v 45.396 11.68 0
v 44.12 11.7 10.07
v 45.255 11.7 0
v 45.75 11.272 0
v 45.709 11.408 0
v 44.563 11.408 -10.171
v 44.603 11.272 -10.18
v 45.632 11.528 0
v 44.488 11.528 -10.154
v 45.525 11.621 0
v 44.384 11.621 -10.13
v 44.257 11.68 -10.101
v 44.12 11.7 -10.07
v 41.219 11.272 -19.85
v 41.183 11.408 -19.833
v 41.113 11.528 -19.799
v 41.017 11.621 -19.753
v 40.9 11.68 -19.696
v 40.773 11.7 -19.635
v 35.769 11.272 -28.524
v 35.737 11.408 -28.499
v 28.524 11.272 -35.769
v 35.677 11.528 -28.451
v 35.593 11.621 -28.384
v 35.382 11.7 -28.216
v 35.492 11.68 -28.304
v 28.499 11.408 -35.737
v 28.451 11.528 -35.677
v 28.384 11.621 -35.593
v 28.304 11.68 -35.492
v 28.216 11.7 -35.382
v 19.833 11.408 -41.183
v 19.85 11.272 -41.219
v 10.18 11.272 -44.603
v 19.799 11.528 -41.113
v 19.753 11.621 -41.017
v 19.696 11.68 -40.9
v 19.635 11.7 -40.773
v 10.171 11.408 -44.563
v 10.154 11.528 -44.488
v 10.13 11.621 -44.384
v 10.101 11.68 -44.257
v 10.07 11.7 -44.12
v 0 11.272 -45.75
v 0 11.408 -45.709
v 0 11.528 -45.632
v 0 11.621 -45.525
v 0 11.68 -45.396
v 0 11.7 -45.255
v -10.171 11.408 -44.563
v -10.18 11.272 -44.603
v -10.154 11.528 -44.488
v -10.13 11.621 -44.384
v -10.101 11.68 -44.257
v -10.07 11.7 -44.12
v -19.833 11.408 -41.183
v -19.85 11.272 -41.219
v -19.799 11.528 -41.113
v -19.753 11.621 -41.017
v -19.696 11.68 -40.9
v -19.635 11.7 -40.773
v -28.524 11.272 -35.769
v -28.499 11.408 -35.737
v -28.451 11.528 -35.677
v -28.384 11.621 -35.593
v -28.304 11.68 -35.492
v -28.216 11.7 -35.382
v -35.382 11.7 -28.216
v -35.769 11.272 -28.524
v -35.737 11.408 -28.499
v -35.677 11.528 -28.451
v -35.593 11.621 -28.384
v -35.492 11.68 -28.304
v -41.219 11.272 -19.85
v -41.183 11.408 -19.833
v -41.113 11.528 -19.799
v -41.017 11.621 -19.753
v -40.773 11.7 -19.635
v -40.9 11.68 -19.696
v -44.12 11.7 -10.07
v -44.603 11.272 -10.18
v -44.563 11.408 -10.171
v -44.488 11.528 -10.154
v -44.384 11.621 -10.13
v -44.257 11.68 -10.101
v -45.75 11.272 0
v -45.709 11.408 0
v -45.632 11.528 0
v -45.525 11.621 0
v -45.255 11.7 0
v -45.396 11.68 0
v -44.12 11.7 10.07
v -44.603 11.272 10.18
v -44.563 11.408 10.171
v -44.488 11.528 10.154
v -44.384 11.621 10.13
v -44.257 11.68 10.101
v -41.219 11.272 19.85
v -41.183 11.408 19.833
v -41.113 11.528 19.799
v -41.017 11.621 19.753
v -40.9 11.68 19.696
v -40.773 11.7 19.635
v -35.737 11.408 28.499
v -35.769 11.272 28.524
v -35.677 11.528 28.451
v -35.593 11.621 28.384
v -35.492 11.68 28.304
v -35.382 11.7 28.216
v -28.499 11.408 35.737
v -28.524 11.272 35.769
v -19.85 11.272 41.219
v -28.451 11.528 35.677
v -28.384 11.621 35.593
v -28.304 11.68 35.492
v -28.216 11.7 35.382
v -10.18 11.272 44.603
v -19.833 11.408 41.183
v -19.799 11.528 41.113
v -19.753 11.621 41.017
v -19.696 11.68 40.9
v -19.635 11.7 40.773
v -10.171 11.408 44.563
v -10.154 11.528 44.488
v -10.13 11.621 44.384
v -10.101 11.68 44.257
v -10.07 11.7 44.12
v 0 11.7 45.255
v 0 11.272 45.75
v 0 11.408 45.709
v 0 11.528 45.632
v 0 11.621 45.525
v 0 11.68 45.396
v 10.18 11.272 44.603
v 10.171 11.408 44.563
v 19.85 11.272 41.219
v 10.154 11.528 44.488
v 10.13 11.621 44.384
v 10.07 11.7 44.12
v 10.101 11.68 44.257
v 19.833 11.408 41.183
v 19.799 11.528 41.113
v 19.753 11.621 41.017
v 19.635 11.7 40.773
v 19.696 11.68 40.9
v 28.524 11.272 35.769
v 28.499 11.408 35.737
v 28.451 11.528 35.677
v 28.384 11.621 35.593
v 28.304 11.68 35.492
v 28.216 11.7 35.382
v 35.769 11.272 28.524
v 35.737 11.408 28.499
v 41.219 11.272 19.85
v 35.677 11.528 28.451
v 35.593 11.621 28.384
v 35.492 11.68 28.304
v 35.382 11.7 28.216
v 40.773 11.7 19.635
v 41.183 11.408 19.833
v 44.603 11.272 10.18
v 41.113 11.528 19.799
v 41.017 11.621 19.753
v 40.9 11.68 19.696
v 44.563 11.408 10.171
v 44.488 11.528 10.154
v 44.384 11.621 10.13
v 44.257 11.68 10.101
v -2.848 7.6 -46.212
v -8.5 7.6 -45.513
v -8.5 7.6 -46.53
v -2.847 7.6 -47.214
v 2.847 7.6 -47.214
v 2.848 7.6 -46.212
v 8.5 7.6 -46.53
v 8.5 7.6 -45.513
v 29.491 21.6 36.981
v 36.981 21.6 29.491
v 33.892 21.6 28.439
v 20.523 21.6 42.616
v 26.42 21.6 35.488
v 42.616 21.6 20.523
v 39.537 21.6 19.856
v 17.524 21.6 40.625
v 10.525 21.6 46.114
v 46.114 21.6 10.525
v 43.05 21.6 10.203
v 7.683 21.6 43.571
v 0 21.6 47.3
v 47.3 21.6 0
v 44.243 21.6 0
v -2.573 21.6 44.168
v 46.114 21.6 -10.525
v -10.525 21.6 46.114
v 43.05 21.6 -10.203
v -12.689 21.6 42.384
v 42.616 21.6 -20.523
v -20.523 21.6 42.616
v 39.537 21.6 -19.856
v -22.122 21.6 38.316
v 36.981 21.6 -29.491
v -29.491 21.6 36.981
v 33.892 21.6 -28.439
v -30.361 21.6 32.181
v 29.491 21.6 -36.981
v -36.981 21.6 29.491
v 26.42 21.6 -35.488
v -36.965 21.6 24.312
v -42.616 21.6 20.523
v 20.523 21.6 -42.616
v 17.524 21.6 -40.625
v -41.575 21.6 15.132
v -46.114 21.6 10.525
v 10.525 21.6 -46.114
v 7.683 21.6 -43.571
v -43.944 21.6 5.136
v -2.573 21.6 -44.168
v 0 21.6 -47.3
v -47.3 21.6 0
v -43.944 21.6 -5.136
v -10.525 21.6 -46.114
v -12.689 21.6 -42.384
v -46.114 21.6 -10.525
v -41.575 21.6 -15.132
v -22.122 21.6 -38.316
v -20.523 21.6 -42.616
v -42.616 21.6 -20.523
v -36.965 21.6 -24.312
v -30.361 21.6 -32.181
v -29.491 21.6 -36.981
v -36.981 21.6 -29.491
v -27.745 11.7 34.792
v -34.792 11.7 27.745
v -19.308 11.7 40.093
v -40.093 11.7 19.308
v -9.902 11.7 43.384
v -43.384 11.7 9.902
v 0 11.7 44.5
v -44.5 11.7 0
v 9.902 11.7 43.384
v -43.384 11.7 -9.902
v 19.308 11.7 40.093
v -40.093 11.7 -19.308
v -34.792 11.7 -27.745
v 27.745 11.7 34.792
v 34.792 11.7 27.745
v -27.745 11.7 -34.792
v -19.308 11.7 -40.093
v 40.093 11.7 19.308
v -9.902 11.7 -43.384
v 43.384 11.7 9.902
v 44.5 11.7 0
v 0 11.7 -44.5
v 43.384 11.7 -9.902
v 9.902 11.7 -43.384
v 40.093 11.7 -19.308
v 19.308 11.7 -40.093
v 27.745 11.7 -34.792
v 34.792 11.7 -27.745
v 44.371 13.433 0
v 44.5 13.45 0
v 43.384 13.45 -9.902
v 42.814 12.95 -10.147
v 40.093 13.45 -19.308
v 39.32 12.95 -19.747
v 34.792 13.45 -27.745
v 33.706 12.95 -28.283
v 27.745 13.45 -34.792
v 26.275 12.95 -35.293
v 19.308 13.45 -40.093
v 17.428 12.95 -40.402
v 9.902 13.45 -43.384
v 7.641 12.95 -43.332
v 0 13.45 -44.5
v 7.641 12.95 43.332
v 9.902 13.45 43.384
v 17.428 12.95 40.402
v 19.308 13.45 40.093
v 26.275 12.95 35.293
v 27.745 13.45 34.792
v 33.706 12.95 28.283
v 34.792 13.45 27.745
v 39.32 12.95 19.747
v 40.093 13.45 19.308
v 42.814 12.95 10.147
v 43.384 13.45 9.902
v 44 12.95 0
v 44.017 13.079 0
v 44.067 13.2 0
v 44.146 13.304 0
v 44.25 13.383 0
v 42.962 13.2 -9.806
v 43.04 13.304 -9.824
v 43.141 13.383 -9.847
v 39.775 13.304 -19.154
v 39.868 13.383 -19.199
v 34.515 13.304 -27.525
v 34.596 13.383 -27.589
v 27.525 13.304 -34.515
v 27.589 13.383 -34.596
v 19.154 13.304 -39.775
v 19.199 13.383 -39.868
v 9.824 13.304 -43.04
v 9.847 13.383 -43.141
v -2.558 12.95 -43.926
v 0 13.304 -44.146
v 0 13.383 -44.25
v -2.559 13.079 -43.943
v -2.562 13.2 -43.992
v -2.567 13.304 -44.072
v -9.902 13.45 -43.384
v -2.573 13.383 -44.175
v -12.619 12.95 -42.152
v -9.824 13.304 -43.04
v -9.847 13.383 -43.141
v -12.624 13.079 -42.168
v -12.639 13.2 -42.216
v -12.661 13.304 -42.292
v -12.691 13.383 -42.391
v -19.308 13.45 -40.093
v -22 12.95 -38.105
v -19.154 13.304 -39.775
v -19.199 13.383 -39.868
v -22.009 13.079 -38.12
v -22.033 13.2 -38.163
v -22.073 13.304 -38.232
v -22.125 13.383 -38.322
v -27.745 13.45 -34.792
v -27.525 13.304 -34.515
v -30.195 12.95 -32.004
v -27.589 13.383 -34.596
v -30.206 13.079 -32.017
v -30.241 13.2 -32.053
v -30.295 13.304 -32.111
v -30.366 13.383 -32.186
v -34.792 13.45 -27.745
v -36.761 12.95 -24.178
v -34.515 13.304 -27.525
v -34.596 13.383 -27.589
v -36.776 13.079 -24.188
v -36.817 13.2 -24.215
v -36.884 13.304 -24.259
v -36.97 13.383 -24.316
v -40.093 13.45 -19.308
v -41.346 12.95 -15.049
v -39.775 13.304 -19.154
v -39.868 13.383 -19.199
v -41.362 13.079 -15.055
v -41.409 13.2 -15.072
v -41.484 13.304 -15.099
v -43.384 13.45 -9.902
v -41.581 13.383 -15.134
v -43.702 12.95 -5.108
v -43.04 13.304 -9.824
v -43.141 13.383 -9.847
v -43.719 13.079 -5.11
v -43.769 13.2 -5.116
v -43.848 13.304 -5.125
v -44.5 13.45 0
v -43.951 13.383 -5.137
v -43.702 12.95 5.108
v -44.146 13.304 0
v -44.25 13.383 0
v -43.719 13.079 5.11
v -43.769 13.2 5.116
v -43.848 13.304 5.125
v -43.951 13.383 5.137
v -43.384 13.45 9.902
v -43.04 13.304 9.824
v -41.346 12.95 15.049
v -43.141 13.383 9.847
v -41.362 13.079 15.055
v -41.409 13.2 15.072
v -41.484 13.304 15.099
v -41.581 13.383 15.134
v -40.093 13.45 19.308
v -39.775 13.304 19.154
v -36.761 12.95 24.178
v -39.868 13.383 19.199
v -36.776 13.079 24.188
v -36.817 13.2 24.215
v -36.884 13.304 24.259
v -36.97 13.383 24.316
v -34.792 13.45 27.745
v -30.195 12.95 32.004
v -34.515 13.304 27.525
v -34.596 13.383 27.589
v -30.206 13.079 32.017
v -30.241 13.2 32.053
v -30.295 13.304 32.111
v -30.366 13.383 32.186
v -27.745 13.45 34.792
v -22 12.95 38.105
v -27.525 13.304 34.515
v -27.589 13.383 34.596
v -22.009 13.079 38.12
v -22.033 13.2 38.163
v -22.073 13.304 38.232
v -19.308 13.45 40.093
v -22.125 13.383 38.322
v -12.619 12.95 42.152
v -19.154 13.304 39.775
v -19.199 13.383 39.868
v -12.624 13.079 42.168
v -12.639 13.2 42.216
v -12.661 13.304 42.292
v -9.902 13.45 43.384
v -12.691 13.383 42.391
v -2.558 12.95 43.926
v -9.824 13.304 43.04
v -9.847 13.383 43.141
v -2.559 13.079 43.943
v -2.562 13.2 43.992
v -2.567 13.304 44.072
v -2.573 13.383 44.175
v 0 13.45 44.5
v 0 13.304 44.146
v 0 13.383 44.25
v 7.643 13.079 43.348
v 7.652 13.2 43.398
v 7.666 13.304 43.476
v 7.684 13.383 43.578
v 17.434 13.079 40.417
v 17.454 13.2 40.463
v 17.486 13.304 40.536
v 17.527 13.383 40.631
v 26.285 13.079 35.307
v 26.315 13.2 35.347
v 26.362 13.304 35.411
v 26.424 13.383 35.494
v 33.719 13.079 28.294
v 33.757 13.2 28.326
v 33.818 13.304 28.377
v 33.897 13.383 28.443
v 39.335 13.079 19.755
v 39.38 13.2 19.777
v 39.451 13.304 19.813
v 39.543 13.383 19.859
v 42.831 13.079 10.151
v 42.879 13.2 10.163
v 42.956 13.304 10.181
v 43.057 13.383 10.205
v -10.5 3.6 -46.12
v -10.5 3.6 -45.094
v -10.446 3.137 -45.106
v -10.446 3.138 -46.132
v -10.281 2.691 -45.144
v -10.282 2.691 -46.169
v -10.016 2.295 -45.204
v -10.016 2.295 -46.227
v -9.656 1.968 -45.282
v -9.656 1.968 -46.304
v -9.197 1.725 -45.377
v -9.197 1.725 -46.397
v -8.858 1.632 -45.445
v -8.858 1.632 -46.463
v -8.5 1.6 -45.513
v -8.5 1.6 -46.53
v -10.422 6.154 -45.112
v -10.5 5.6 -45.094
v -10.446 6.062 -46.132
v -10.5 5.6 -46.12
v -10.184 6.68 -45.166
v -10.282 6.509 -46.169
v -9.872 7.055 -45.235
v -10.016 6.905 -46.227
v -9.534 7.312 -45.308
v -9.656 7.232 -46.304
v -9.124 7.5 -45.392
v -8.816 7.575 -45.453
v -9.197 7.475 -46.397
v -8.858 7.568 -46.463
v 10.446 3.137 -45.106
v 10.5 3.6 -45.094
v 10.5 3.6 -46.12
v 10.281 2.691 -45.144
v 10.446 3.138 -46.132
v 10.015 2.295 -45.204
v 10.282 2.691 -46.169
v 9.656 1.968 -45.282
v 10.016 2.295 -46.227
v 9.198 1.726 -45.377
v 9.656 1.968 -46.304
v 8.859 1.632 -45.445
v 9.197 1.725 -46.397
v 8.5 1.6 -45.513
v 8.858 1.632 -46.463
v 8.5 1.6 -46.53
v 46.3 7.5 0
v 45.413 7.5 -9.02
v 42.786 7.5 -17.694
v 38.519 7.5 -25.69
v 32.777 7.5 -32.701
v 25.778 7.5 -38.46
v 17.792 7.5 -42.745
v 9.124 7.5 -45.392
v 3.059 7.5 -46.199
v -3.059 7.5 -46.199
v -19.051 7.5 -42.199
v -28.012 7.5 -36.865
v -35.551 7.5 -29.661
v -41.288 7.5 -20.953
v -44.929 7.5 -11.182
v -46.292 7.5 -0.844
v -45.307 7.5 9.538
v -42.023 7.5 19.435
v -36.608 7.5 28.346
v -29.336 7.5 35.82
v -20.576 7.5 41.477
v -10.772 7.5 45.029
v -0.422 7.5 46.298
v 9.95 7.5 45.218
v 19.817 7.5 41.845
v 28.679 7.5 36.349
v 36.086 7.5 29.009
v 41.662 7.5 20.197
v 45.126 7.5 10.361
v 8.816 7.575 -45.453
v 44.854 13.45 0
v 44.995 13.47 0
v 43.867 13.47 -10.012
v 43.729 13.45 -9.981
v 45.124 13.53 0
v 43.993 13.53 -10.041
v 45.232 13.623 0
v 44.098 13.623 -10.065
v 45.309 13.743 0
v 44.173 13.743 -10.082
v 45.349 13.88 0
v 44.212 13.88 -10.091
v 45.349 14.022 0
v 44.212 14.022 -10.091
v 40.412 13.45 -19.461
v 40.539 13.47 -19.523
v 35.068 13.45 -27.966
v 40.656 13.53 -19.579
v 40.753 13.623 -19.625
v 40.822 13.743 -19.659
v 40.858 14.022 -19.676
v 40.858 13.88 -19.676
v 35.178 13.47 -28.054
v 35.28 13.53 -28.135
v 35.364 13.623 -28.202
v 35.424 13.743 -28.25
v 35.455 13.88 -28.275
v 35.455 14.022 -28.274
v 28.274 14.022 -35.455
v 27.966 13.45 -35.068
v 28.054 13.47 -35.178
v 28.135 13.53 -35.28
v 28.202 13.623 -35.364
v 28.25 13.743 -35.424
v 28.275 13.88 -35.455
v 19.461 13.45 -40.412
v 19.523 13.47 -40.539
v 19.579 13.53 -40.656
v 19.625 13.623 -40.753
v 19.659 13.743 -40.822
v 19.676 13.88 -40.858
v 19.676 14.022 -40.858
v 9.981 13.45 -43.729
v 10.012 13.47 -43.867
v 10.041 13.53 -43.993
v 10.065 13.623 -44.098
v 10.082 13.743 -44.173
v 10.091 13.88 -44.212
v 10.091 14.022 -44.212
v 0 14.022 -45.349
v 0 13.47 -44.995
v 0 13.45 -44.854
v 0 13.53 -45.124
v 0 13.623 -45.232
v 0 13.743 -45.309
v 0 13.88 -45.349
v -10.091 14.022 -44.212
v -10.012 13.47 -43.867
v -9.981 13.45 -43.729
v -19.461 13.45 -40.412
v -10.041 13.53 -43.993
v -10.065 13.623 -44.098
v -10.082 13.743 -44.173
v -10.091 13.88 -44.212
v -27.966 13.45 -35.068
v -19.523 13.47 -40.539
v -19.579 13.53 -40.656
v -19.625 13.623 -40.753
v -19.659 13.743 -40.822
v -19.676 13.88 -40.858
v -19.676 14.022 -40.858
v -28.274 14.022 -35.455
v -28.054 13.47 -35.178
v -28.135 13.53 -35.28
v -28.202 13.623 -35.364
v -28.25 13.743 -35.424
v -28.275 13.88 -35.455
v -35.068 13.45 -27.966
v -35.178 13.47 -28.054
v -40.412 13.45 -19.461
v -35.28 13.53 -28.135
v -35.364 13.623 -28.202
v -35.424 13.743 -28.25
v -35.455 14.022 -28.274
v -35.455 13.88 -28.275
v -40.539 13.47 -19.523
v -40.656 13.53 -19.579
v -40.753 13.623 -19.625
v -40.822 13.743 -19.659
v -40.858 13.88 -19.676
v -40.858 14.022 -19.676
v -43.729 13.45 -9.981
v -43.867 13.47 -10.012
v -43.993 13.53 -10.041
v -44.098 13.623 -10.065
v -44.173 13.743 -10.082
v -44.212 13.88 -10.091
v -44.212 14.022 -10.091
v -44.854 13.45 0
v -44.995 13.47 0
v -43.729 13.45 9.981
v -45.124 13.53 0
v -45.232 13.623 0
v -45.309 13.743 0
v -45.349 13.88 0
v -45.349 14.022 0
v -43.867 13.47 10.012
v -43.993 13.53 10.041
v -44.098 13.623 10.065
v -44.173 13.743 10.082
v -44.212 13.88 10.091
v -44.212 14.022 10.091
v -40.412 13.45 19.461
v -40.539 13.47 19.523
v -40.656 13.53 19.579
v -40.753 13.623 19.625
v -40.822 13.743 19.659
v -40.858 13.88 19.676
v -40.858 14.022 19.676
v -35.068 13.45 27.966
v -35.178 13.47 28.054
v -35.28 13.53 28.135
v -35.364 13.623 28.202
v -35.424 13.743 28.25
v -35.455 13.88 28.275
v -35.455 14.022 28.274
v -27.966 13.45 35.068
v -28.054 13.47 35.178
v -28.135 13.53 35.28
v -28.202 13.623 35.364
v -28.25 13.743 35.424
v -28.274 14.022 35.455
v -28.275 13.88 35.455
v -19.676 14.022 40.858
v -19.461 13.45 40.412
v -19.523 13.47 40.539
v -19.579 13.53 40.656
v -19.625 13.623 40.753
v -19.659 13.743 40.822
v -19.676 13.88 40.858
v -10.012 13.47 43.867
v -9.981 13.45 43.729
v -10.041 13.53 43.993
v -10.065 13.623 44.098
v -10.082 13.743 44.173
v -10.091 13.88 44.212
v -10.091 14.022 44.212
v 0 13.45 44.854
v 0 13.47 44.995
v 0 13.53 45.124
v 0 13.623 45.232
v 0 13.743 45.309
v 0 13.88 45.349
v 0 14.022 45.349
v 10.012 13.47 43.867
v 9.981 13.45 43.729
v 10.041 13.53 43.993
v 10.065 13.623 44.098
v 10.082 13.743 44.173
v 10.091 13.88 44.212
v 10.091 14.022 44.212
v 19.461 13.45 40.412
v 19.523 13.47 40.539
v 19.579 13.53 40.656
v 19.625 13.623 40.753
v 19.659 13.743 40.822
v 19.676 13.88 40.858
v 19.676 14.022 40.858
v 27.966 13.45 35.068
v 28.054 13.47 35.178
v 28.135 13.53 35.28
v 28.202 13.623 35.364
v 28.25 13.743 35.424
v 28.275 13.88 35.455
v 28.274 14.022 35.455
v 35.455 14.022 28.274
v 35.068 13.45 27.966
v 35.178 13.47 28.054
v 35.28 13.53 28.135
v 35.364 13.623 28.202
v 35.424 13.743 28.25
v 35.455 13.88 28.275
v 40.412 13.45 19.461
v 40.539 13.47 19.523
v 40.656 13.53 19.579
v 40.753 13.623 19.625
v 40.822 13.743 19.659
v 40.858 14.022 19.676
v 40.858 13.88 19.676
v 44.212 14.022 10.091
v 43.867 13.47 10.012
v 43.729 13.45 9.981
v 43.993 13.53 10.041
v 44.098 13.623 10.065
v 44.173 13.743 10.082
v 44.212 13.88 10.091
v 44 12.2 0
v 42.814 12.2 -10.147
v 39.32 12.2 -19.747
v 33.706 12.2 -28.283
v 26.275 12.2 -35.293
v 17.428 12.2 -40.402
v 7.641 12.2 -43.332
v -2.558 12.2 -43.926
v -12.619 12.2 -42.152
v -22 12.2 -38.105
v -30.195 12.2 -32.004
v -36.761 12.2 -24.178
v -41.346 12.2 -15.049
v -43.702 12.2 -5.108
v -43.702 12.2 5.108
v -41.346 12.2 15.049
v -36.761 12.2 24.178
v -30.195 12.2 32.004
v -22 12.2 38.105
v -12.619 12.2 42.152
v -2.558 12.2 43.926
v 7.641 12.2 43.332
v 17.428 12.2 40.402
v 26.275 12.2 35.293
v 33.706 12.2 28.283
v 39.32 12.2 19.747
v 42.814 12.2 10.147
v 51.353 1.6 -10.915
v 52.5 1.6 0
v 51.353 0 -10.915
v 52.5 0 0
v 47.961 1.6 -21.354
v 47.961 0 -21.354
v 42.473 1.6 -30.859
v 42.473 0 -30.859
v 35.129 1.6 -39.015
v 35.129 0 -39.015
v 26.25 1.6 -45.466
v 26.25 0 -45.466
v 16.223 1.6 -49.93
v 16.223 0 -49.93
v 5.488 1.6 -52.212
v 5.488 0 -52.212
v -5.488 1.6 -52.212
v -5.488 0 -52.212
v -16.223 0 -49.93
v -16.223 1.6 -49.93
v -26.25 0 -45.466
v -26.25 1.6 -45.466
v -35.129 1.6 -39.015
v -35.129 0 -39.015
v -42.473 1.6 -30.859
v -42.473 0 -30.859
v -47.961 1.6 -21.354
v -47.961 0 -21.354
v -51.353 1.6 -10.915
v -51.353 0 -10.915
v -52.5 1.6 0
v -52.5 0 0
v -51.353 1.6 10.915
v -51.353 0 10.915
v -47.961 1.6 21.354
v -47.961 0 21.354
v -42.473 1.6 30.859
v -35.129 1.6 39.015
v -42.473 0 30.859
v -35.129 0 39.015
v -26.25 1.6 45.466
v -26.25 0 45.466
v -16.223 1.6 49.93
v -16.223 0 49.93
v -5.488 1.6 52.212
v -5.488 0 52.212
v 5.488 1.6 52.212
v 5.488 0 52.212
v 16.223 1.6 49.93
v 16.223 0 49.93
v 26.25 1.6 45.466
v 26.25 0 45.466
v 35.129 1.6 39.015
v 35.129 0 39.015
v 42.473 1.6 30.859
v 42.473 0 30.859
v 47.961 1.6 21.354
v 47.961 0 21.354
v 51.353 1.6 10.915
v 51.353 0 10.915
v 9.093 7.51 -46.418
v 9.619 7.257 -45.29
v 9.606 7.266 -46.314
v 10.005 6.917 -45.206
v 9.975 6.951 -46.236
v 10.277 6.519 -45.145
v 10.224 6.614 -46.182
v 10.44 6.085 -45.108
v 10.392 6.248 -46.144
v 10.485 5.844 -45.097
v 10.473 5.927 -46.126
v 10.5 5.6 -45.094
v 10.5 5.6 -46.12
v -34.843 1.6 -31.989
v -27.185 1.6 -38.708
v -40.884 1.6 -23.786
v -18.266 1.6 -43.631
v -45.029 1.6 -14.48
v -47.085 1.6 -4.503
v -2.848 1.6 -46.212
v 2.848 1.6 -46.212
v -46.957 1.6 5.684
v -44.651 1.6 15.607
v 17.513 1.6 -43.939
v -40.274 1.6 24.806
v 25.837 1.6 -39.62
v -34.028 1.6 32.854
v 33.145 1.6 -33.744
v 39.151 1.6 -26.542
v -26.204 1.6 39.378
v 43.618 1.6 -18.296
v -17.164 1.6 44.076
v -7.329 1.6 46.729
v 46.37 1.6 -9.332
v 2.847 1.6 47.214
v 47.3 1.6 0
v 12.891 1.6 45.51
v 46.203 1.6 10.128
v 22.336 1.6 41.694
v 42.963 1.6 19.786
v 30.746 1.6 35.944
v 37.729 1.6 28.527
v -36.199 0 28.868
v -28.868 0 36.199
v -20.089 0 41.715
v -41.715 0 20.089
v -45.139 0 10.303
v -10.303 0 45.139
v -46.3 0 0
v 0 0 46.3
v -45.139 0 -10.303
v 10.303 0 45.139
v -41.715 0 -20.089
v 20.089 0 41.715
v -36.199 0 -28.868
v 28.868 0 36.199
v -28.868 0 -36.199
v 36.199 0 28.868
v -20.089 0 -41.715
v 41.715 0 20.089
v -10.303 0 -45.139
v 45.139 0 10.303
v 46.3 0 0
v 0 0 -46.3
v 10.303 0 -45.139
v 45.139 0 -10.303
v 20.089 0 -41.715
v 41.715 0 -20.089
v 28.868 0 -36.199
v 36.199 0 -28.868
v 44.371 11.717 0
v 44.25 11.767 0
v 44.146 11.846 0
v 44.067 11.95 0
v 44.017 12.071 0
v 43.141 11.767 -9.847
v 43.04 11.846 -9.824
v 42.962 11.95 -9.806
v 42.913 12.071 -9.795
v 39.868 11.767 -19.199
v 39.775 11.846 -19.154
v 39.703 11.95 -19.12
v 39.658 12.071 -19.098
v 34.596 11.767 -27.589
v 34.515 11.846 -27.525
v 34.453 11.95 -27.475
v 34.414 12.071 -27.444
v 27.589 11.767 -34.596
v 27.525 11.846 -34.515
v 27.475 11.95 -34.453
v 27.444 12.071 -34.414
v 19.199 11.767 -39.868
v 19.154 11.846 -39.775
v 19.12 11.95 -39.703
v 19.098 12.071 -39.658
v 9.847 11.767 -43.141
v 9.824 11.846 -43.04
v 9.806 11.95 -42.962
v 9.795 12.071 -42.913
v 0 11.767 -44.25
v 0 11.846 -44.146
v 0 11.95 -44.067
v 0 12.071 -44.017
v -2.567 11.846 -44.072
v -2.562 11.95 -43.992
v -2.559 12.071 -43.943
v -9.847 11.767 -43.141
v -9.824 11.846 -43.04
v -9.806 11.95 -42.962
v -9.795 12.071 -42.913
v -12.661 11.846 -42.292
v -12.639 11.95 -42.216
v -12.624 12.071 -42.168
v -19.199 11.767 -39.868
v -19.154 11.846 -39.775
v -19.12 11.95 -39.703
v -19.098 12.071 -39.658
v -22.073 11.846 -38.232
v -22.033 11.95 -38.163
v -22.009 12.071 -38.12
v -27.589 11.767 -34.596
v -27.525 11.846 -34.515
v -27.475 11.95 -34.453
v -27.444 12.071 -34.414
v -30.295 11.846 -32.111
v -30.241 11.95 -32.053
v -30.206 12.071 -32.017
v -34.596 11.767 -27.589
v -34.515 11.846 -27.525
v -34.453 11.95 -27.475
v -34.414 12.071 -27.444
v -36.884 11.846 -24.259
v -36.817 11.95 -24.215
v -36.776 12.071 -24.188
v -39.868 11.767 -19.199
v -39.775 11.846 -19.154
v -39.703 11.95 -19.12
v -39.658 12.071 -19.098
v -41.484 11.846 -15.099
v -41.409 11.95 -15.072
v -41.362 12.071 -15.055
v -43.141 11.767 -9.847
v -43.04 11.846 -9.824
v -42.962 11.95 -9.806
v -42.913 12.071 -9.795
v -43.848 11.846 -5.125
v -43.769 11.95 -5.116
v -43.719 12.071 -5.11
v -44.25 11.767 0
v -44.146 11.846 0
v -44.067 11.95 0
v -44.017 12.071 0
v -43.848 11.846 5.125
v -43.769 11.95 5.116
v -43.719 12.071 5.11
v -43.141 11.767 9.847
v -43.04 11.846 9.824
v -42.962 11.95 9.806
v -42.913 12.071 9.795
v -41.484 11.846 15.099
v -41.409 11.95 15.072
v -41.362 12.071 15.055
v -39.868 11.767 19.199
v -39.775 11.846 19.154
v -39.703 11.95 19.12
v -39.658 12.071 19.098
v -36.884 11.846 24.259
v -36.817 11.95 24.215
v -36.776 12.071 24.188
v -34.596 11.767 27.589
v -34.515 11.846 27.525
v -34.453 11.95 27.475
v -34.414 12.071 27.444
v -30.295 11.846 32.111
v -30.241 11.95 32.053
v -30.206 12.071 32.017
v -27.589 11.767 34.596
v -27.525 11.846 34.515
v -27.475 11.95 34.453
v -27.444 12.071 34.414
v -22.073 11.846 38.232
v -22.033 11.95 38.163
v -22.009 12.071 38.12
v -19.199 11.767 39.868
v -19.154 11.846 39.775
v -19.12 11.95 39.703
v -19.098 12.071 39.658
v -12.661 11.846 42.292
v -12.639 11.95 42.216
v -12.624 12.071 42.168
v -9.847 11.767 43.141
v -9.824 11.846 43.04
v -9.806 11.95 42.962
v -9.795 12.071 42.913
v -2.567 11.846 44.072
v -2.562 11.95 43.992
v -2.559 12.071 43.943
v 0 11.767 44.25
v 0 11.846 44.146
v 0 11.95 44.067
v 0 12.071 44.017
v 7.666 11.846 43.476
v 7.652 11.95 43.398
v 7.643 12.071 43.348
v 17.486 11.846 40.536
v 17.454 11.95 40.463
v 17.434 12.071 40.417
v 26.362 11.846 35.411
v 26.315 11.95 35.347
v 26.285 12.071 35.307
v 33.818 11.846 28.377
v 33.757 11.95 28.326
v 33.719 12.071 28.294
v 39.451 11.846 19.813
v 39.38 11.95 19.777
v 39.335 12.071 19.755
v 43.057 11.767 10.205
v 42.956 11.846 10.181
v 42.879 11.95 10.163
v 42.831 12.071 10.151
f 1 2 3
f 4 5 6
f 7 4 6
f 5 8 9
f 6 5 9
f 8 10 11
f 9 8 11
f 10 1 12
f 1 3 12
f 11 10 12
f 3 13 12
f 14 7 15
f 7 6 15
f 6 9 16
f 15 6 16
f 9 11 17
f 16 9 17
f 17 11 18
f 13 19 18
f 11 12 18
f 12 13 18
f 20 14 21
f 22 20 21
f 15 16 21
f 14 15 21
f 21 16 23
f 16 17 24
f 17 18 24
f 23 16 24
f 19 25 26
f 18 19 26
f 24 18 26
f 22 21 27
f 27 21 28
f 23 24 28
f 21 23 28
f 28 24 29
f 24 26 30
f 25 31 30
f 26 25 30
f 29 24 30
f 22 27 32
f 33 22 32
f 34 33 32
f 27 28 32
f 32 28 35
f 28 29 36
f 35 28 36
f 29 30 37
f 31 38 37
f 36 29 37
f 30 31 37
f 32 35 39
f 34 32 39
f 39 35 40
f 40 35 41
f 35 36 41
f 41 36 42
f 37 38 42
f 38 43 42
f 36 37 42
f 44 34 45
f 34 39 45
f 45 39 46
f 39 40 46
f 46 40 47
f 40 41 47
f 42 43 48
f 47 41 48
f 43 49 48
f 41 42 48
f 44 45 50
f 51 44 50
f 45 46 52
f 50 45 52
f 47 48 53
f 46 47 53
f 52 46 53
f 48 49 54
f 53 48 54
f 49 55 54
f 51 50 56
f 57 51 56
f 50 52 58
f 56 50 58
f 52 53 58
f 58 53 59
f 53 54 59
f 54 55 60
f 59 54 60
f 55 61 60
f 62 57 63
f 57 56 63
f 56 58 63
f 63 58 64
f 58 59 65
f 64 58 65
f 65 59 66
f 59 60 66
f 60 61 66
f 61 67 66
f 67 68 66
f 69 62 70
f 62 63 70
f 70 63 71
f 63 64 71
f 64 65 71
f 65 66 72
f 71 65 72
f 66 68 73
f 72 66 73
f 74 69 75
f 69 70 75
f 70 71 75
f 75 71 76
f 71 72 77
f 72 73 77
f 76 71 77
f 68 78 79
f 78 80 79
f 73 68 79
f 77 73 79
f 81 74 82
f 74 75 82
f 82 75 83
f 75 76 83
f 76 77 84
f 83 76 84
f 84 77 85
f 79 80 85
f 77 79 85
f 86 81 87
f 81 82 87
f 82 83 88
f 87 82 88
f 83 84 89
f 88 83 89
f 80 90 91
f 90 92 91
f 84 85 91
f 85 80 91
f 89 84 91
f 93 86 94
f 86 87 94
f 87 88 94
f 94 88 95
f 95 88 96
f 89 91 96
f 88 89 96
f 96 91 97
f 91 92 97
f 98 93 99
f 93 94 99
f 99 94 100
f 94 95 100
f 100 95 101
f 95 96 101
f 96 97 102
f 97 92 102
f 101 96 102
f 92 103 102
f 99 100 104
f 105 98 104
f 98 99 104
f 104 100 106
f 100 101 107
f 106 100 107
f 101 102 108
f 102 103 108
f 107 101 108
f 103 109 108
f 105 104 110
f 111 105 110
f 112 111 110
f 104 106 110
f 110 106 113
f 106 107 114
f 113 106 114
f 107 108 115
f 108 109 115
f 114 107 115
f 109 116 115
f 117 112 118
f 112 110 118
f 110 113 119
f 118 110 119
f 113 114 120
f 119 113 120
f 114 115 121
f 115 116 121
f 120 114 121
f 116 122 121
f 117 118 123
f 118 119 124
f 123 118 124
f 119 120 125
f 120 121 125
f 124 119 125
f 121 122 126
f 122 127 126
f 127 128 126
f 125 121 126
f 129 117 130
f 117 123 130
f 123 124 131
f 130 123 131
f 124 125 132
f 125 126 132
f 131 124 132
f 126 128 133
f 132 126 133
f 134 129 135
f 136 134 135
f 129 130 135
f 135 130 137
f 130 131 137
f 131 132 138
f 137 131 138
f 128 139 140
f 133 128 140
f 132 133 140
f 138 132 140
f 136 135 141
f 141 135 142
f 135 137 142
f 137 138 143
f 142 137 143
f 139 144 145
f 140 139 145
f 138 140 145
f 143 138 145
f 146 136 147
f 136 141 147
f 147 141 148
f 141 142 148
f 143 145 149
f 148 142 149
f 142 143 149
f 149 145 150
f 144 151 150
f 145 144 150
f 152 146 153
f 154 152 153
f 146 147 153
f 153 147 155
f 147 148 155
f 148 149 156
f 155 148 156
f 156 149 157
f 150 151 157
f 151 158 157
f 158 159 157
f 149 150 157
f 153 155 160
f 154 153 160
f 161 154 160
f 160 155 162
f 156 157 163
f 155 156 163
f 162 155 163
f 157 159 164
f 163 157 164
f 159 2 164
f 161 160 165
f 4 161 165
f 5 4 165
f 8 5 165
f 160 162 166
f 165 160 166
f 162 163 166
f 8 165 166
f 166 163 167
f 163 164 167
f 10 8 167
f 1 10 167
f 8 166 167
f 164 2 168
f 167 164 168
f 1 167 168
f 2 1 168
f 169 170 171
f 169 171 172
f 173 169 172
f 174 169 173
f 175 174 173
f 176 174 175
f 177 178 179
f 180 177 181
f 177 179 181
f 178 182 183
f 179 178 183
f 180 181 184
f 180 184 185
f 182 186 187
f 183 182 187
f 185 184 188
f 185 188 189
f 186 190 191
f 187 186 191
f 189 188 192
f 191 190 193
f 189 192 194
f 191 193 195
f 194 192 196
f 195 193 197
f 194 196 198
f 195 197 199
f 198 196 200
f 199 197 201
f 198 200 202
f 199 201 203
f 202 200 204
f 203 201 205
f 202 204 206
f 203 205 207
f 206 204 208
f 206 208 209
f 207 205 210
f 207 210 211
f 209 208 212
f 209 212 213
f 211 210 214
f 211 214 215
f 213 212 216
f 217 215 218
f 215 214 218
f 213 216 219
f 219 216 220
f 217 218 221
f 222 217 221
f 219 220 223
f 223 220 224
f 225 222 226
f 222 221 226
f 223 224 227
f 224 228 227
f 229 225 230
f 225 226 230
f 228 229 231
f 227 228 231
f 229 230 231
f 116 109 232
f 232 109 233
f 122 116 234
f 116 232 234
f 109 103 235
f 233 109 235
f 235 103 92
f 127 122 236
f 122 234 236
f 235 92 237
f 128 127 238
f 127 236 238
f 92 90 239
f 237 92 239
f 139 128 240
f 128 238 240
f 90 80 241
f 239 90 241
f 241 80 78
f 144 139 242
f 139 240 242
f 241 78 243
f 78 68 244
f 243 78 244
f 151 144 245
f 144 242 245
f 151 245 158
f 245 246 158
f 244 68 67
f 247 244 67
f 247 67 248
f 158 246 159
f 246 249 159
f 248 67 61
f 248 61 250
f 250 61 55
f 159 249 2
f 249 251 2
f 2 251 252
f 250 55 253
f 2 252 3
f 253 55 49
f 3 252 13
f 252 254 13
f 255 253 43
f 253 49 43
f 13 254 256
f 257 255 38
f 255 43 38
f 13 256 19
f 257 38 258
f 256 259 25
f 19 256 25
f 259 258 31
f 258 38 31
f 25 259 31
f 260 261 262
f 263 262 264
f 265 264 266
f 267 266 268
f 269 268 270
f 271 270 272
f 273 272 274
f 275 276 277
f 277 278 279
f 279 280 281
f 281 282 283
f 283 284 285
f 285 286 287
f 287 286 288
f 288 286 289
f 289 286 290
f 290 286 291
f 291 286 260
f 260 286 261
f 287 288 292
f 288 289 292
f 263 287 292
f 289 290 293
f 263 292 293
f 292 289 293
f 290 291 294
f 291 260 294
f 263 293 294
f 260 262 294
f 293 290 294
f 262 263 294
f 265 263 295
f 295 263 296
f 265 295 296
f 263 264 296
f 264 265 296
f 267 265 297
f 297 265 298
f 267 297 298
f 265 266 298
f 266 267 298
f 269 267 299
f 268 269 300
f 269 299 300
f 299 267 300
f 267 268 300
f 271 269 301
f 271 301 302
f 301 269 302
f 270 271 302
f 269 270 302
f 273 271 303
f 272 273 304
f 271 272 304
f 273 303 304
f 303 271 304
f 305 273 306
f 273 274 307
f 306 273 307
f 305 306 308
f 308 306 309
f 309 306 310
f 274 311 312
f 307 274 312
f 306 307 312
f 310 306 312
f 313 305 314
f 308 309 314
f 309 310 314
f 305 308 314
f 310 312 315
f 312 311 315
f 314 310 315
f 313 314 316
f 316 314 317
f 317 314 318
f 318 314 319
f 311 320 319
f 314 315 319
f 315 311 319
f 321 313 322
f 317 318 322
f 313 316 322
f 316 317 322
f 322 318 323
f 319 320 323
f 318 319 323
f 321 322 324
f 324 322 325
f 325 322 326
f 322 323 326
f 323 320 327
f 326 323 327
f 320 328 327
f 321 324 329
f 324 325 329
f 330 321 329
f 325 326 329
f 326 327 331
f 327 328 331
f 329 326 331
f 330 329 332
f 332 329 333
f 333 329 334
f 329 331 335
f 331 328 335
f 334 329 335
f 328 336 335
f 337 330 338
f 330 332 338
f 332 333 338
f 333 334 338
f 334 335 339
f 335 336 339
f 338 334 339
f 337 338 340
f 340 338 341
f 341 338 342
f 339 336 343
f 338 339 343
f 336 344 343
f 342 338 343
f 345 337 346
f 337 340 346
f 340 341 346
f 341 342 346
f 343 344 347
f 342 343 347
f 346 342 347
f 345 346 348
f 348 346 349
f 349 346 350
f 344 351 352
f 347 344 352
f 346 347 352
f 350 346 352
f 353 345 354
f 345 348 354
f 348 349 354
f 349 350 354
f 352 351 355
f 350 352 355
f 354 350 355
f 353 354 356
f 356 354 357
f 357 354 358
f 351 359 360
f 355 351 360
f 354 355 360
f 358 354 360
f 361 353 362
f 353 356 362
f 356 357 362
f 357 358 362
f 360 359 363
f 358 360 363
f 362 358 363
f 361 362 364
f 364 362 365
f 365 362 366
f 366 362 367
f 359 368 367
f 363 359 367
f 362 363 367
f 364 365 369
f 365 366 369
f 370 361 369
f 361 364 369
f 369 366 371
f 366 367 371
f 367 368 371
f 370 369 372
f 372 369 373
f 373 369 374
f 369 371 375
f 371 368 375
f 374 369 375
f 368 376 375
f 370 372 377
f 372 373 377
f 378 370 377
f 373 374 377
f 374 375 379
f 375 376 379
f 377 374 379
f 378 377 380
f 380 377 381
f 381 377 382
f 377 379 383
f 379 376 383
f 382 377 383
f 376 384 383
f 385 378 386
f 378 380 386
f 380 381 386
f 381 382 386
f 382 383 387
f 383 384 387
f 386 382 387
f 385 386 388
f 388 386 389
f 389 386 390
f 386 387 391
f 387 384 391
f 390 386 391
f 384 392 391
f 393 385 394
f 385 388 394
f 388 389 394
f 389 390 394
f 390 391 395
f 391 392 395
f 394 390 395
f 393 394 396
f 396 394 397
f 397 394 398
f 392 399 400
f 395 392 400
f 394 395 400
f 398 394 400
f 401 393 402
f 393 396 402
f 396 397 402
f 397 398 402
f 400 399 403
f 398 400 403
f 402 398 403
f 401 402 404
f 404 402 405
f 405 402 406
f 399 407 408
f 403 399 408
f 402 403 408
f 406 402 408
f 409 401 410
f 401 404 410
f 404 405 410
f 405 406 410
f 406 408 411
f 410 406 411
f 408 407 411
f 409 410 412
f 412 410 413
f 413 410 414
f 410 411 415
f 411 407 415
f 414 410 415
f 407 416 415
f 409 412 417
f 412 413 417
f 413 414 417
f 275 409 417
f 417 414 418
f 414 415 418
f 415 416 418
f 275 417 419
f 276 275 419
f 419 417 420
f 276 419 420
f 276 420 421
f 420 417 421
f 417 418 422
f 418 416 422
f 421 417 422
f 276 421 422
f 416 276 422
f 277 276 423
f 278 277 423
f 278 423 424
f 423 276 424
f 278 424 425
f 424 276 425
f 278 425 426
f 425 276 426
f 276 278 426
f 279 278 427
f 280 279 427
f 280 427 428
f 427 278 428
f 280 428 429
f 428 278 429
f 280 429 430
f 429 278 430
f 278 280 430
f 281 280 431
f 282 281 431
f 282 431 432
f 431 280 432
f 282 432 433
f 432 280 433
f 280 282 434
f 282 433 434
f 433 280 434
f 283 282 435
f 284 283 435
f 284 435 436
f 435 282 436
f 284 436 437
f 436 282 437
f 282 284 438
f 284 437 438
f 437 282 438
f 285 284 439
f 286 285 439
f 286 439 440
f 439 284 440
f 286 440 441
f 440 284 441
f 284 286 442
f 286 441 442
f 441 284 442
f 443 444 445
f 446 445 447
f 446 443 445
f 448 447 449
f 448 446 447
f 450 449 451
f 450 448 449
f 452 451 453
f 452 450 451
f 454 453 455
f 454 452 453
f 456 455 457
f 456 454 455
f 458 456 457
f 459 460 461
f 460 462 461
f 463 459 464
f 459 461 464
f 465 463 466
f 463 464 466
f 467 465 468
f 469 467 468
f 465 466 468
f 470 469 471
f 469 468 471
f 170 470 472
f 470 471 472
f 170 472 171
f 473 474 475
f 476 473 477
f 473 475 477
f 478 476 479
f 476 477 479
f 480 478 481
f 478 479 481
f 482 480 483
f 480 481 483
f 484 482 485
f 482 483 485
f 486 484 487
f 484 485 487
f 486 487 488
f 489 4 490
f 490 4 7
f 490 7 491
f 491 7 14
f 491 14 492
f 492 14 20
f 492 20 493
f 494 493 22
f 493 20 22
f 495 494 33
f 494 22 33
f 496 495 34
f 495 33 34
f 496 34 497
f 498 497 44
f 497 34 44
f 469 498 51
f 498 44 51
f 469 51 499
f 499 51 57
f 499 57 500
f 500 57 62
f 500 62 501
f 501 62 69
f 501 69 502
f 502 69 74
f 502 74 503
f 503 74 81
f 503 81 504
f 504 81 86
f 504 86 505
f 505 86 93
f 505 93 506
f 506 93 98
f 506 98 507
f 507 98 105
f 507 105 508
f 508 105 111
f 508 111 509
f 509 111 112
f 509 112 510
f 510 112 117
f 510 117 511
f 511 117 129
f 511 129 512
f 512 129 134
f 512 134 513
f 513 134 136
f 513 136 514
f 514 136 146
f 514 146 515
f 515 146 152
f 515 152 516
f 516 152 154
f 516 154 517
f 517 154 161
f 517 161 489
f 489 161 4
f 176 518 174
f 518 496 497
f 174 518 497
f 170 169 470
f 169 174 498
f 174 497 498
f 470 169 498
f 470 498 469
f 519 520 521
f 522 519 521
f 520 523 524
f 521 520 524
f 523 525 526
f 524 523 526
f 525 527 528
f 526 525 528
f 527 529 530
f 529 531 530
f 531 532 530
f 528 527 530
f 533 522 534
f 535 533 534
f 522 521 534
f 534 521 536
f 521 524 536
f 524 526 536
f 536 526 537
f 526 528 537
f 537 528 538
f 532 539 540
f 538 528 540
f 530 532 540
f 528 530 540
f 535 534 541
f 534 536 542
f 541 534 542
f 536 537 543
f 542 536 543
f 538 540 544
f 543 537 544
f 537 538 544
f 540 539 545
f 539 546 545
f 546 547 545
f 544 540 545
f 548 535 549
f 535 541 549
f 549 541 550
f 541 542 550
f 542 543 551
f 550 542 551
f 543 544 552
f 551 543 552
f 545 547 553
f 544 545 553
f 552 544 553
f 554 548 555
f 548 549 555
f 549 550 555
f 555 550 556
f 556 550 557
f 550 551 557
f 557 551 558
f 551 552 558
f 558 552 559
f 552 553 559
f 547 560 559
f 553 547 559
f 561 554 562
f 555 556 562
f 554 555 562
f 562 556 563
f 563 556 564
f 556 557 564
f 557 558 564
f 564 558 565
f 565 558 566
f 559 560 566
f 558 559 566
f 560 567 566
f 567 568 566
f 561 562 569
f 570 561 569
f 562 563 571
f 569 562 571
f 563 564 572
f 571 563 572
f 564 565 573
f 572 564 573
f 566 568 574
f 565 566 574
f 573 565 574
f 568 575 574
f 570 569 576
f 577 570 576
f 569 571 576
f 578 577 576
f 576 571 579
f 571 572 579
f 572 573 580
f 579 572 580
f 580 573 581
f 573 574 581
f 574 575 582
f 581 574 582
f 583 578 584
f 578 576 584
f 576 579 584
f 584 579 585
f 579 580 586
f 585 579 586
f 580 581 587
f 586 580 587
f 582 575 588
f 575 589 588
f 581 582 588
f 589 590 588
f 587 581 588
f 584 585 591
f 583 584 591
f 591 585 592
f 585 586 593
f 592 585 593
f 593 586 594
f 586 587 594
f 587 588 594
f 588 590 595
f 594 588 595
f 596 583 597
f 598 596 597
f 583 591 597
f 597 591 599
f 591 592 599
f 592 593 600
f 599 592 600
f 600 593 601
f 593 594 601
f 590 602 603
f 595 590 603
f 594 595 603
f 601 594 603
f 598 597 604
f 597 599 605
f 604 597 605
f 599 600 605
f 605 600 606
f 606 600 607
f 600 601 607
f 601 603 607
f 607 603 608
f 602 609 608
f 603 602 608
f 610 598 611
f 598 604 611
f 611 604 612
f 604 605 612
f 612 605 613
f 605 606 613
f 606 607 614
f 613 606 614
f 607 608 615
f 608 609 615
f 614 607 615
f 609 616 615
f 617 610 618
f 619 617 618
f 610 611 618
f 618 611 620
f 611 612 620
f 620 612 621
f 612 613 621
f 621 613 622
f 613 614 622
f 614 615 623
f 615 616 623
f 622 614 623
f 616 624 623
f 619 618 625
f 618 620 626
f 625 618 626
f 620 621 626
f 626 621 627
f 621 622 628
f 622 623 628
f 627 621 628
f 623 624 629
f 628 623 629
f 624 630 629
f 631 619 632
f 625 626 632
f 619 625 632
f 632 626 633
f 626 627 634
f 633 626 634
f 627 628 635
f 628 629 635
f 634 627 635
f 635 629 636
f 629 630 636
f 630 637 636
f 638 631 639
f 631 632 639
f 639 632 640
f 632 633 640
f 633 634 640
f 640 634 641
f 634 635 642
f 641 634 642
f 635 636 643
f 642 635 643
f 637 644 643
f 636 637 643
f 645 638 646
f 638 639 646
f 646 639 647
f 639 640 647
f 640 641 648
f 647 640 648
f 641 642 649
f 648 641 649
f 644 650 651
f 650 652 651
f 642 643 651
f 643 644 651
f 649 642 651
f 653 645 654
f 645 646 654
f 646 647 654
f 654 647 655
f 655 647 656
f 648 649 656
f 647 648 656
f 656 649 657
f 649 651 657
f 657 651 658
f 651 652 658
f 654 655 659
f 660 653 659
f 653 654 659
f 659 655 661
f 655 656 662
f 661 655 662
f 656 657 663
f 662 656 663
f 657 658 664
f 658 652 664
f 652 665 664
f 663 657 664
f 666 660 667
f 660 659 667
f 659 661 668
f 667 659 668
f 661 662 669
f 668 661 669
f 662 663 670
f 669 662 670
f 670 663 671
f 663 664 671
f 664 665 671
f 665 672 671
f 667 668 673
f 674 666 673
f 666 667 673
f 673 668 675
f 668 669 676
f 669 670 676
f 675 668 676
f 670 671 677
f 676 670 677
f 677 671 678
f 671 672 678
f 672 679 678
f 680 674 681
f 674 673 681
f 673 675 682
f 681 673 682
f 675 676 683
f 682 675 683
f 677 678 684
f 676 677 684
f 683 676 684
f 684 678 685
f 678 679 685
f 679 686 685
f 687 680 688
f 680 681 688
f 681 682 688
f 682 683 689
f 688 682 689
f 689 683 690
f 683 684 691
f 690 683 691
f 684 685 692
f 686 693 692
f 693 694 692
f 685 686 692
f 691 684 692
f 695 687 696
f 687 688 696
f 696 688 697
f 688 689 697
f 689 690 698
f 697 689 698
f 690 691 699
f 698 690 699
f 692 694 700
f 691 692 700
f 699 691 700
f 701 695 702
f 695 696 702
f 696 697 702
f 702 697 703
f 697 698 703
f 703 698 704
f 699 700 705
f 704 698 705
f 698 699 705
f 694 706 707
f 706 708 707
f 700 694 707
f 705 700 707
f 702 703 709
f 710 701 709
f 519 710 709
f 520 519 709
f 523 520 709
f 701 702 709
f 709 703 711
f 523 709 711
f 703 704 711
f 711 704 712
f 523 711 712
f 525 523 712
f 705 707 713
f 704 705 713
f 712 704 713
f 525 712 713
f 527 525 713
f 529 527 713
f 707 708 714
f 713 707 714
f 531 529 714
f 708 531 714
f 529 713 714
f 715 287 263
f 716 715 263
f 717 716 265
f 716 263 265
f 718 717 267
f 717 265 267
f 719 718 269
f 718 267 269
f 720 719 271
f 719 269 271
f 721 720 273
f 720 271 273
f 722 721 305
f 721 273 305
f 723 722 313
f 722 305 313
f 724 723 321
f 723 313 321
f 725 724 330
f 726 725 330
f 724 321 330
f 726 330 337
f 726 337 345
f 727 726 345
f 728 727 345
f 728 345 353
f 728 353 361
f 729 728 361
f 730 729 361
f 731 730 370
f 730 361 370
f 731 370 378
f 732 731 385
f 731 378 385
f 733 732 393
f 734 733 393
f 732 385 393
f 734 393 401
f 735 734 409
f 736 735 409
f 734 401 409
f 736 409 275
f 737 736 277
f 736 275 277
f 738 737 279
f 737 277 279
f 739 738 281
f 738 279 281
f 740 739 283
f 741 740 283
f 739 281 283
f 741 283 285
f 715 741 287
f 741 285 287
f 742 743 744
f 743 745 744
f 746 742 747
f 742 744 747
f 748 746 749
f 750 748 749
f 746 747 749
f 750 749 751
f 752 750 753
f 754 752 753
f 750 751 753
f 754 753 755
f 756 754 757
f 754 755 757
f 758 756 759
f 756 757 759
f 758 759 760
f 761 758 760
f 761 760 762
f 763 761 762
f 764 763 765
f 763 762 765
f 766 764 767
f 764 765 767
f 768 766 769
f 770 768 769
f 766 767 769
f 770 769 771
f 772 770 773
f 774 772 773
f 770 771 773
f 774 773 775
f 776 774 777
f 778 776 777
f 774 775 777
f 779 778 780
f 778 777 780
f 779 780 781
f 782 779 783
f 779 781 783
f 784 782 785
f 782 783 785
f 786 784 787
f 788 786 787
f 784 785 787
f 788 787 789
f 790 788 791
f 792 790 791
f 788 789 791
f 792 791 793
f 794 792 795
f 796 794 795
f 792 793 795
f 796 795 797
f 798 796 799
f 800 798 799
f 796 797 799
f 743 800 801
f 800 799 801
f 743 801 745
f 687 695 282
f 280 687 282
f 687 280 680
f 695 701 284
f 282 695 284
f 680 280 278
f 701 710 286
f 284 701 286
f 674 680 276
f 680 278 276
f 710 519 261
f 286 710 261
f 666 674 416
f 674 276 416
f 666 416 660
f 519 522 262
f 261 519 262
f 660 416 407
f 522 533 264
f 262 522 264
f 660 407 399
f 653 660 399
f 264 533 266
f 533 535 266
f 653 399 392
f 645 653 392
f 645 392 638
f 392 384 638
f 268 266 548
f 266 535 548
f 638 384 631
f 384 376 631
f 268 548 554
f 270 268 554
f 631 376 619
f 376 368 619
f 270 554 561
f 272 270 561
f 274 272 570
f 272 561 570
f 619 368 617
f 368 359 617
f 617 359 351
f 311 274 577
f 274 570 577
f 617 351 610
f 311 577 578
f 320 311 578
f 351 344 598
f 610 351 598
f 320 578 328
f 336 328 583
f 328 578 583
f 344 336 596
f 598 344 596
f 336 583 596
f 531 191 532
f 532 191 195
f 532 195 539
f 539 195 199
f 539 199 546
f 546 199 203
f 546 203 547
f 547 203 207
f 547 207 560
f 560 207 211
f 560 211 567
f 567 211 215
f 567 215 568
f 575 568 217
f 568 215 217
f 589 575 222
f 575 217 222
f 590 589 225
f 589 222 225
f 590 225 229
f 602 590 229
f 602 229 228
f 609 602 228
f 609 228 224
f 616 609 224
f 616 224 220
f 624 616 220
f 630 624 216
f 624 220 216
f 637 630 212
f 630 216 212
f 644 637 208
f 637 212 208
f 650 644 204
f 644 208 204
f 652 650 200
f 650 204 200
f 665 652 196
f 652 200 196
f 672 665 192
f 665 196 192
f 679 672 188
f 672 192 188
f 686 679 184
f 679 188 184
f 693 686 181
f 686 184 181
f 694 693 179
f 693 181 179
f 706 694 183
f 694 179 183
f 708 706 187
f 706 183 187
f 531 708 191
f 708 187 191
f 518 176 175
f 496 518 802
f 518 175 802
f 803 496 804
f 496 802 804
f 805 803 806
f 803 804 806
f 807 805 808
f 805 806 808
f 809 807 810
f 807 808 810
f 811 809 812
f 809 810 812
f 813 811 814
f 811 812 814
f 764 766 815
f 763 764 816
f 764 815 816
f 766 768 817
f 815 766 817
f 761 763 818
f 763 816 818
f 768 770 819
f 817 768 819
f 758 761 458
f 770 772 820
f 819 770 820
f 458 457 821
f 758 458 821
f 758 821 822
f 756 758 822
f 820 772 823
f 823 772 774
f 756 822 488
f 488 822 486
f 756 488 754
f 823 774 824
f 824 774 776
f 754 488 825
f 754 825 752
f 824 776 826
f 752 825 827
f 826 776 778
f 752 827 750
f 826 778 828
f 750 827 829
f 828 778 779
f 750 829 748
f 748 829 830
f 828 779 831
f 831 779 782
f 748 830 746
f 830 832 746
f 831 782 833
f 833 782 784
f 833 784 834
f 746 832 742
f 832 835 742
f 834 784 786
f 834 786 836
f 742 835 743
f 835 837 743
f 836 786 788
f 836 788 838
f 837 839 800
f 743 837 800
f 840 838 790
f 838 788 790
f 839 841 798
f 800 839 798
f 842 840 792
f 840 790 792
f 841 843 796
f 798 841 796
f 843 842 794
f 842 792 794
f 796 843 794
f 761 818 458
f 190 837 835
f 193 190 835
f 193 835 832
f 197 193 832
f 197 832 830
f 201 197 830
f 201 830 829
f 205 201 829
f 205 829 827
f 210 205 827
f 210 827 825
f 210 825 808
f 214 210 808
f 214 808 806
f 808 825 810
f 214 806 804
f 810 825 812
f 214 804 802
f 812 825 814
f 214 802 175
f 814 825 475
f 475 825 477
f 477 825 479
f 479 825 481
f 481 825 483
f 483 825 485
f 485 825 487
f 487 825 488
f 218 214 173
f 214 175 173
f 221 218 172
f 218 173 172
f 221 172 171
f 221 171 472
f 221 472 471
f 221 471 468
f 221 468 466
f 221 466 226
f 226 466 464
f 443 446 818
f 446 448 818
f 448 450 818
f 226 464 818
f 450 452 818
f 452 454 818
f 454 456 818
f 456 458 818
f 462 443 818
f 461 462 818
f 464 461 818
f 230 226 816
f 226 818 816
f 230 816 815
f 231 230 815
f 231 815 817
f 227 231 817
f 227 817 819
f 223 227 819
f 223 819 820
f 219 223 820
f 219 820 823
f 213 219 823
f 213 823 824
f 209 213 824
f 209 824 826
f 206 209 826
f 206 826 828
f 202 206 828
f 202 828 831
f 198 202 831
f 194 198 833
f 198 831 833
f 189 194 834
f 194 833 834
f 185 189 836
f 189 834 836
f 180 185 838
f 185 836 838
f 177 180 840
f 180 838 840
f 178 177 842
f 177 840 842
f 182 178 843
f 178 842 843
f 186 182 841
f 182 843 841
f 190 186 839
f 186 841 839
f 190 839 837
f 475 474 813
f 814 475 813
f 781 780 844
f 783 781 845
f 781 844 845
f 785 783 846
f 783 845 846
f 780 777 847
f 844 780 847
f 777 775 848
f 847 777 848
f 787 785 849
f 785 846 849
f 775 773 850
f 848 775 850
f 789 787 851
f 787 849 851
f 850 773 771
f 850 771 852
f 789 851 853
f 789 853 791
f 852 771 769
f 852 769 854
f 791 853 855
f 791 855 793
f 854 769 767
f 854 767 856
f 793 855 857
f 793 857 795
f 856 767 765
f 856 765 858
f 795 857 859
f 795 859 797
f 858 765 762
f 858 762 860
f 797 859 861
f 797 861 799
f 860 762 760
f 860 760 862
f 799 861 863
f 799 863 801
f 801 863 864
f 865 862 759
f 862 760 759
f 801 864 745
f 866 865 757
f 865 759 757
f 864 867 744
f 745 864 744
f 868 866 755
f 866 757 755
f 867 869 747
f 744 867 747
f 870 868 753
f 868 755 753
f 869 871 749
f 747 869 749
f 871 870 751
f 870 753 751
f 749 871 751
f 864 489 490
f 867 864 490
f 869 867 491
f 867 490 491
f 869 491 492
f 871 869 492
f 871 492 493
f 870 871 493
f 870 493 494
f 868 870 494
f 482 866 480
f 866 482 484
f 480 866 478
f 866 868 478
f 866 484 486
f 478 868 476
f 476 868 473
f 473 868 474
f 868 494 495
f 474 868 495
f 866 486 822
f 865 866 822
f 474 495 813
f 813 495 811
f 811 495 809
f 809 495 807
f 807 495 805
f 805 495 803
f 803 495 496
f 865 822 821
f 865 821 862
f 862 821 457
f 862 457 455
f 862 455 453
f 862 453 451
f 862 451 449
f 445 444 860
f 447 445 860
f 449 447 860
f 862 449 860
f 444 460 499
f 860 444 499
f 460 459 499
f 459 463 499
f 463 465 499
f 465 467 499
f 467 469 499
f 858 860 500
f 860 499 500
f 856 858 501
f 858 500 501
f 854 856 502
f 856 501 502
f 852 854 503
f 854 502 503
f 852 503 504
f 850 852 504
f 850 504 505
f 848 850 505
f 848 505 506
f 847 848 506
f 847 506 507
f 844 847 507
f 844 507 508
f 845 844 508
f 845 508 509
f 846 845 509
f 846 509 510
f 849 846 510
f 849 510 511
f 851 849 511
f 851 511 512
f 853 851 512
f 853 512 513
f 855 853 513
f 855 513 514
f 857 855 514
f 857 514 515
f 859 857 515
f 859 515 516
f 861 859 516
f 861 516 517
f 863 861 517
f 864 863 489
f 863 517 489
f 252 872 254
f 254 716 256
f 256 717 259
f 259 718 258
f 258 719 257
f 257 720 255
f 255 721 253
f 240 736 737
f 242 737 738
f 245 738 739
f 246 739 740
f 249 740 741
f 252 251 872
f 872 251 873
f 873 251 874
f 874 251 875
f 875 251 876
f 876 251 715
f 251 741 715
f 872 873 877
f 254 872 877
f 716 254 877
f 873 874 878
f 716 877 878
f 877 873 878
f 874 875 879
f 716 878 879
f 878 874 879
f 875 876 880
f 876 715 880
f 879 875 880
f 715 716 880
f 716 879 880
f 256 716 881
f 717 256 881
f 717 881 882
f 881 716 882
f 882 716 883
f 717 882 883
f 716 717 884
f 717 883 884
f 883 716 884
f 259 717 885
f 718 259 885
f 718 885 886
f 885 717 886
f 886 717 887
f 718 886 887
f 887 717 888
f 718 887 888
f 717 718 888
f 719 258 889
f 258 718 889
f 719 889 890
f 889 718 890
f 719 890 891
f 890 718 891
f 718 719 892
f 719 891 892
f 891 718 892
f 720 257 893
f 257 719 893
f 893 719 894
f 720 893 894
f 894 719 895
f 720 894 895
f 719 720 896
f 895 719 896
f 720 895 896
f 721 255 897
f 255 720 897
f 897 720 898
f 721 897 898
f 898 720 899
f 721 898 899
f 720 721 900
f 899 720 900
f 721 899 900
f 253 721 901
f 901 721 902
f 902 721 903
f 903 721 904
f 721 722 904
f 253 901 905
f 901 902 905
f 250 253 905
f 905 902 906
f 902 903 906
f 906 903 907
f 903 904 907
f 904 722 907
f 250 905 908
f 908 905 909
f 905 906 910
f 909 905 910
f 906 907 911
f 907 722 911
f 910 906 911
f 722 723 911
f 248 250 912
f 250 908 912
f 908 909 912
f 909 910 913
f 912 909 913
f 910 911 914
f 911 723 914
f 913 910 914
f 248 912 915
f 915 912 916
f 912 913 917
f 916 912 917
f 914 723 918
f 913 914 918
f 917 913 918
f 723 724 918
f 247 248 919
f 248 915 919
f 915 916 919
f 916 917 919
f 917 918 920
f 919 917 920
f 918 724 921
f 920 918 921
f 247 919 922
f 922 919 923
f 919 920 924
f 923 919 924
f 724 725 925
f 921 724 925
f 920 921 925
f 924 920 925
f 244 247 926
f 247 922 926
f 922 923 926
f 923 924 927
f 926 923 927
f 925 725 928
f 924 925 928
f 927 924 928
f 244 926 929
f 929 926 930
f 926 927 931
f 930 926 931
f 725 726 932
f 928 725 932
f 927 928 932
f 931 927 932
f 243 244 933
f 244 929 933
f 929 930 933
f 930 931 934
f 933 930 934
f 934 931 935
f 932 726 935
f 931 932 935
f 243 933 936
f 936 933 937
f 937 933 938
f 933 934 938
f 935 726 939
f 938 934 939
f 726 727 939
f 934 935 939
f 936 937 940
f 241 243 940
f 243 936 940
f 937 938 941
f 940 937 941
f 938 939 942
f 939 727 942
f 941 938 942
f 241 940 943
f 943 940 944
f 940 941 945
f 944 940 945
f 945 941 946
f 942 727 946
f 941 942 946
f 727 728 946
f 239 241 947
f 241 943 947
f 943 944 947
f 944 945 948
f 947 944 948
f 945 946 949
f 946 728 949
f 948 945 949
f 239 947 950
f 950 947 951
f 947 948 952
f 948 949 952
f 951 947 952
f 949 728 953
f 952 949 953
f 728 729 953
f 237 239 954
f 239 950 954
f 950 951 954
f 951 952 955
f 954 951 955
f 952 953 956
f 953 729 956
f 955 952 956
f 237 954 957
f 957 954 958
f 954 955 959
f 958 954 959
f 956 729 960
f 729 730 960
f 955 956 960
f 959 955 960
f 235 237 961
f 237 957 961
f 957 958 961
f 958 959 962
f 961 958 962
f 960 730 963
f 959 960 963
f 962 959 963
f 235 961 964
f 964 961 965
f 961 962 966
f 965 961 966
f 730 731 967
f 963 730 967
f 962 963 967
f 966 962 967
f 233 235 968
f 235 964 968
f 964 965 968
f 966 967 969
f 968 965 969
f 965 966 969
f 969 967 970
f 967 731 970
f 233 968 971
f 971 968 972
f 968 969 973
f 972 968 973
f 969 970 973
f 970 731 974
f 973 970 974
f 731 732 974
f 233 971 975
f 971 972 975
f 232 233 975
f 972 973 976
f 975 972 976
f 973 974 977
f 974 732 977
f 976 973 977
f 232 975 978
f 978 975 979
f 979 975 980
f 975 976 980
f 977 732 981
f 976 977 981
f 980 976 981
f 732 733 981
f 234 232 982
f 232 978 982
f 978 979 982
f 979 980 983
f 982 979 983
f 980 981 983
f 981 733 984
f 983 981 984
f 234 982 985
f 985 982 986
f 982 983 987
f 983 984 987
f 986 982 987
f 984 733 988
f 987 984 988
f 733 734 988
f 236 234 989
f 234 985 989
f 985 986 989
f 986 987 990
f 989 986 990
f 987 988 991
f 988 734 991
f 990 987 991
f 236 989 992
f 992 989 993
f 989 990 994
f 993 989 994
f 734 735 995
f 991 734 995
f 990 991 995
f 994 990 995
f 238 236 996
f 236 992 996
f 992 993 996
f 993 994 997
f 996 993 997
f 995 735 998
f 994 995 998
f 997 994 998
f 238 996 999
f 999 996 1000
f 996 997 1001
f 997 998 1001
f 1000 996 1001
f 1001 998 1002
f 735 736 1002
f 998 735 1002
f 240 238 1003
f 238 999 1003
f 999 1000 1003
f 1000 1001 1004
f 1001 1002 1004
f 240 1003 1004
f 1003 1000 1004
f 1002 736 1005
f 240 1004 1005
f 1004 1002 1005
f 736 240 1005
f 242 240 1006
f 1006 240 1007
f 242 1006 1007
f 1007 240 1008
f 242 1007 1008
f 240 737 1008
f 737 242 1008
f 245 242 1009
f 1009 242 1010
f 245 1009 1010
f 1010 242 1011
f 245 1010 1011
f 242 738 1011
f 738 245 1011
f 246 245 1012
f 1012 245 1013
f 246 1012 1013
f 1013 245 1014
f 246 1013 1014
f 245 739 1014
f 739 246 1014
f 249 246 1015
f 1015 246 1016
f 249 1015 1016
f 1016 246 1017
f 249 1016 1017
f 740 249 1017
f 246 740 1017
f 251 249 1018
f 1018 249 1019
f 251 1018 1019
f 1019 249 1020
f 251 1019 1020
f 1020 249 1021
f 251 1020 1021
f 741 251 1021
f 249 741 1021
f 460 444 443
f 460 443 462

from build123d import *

# Parameters (mm, degrees)
CUT_EXTRUDE1_REACH      = 79.324
CUT_EXTRUDE1_END_RADIUS = 47.3
SKETCH4_W               = 21
SKETCH4_H               = 6
FILLET1_R               = 2
FILLET2_R               = 0.5


with BuildPart() as part:
    # Sketch2 → Revolve1 (revolve)
    with BuildSketch(Plane.XY):
        Polygon((46.3, 0), (46.3, 21.6), (47.3, 21.6), (47.3, 1.6), (52.5, 1.6), (52.5, 0), align=None)
    revolve(axis=Axis((0, -1000, 0), (0, 1, 0)))

    # Cut-Extrude1: up to this cylinder (the profile starts inside it)
    cut_extrude1_end = Plane(origin=(0, 4.6, 0), z_dir=(0, -1, 0)) * Cylinder(CUT_EXTRUDE1_END_RADIUS, 254.248, mode=Mode.PRIVATE)
    # Sketch4 → Cut-Extrude1 (cut, up to the surface)
    with BuildSketch(Plane.XY, mode=Mode.PRIVATE) as cut_extrude1_sk1:
        with Locations((0, 4.6)):
            Rectangle(SKETCH4_W, SKETCH4_H)
    cut_extrude1_tool1 = extrude(cut_extrude1_sk1.sketch, amount=-CUT_EXTRUDE1_REACH, mode=Mode.PRIVATE) & cut_extrude1_end
    add(cut_extrude1_tool1.solids().sort_by_distance((0, 4.6, 0))[0], mode=Mode.SUBTRACT)

    # Fillet1
    fillet1_edges = [part.edges().sort_by_distance(p)[0] for p in [
        (10.5, 1.6, -45.606762076),
        (-10.5, 7.6, -45.606762076),
        (10.5, 7.6, -45.606762076),
        (-10.5, 1.6, -45.606762076),
    ]]
    fillet(fillet1_edges, radius=FILLET1_R)

    # Sketch6 → Revolve2 (revolve)
    with BuildSketch(Plane.XY, mode=Mode.PRIVATE) as revolve2_sk:
        Polygon((-46.3, 7.5), (-44.243032454, 21.6), (-46.3, 21.6), align=None)
        Polygon((-45.431988872, 13.45), (-45.687286263, 11.7), (-44, 11.7), (-44, 13.45), align=None)
    revolve(revolve2_sk.sketch.rotate(Axis((0, -1000, 0), (0, 1, 0)), 180), axis=Axis((0, -1000, 0), (0, 1, 0)))

    # Fillet2
    fillet2_edges = [part.edges().sort_by_distance(p)[0] for p in [
        (-45.687286263, 11.7, 0),
        (-44, 11.7, 0),
        (-44, 13.45, 0),
        (-45.431988872, 13.45, 0),
    ]]
    fillet(fillet2_edges, radius=FILLET2_R)


solid = part.part
